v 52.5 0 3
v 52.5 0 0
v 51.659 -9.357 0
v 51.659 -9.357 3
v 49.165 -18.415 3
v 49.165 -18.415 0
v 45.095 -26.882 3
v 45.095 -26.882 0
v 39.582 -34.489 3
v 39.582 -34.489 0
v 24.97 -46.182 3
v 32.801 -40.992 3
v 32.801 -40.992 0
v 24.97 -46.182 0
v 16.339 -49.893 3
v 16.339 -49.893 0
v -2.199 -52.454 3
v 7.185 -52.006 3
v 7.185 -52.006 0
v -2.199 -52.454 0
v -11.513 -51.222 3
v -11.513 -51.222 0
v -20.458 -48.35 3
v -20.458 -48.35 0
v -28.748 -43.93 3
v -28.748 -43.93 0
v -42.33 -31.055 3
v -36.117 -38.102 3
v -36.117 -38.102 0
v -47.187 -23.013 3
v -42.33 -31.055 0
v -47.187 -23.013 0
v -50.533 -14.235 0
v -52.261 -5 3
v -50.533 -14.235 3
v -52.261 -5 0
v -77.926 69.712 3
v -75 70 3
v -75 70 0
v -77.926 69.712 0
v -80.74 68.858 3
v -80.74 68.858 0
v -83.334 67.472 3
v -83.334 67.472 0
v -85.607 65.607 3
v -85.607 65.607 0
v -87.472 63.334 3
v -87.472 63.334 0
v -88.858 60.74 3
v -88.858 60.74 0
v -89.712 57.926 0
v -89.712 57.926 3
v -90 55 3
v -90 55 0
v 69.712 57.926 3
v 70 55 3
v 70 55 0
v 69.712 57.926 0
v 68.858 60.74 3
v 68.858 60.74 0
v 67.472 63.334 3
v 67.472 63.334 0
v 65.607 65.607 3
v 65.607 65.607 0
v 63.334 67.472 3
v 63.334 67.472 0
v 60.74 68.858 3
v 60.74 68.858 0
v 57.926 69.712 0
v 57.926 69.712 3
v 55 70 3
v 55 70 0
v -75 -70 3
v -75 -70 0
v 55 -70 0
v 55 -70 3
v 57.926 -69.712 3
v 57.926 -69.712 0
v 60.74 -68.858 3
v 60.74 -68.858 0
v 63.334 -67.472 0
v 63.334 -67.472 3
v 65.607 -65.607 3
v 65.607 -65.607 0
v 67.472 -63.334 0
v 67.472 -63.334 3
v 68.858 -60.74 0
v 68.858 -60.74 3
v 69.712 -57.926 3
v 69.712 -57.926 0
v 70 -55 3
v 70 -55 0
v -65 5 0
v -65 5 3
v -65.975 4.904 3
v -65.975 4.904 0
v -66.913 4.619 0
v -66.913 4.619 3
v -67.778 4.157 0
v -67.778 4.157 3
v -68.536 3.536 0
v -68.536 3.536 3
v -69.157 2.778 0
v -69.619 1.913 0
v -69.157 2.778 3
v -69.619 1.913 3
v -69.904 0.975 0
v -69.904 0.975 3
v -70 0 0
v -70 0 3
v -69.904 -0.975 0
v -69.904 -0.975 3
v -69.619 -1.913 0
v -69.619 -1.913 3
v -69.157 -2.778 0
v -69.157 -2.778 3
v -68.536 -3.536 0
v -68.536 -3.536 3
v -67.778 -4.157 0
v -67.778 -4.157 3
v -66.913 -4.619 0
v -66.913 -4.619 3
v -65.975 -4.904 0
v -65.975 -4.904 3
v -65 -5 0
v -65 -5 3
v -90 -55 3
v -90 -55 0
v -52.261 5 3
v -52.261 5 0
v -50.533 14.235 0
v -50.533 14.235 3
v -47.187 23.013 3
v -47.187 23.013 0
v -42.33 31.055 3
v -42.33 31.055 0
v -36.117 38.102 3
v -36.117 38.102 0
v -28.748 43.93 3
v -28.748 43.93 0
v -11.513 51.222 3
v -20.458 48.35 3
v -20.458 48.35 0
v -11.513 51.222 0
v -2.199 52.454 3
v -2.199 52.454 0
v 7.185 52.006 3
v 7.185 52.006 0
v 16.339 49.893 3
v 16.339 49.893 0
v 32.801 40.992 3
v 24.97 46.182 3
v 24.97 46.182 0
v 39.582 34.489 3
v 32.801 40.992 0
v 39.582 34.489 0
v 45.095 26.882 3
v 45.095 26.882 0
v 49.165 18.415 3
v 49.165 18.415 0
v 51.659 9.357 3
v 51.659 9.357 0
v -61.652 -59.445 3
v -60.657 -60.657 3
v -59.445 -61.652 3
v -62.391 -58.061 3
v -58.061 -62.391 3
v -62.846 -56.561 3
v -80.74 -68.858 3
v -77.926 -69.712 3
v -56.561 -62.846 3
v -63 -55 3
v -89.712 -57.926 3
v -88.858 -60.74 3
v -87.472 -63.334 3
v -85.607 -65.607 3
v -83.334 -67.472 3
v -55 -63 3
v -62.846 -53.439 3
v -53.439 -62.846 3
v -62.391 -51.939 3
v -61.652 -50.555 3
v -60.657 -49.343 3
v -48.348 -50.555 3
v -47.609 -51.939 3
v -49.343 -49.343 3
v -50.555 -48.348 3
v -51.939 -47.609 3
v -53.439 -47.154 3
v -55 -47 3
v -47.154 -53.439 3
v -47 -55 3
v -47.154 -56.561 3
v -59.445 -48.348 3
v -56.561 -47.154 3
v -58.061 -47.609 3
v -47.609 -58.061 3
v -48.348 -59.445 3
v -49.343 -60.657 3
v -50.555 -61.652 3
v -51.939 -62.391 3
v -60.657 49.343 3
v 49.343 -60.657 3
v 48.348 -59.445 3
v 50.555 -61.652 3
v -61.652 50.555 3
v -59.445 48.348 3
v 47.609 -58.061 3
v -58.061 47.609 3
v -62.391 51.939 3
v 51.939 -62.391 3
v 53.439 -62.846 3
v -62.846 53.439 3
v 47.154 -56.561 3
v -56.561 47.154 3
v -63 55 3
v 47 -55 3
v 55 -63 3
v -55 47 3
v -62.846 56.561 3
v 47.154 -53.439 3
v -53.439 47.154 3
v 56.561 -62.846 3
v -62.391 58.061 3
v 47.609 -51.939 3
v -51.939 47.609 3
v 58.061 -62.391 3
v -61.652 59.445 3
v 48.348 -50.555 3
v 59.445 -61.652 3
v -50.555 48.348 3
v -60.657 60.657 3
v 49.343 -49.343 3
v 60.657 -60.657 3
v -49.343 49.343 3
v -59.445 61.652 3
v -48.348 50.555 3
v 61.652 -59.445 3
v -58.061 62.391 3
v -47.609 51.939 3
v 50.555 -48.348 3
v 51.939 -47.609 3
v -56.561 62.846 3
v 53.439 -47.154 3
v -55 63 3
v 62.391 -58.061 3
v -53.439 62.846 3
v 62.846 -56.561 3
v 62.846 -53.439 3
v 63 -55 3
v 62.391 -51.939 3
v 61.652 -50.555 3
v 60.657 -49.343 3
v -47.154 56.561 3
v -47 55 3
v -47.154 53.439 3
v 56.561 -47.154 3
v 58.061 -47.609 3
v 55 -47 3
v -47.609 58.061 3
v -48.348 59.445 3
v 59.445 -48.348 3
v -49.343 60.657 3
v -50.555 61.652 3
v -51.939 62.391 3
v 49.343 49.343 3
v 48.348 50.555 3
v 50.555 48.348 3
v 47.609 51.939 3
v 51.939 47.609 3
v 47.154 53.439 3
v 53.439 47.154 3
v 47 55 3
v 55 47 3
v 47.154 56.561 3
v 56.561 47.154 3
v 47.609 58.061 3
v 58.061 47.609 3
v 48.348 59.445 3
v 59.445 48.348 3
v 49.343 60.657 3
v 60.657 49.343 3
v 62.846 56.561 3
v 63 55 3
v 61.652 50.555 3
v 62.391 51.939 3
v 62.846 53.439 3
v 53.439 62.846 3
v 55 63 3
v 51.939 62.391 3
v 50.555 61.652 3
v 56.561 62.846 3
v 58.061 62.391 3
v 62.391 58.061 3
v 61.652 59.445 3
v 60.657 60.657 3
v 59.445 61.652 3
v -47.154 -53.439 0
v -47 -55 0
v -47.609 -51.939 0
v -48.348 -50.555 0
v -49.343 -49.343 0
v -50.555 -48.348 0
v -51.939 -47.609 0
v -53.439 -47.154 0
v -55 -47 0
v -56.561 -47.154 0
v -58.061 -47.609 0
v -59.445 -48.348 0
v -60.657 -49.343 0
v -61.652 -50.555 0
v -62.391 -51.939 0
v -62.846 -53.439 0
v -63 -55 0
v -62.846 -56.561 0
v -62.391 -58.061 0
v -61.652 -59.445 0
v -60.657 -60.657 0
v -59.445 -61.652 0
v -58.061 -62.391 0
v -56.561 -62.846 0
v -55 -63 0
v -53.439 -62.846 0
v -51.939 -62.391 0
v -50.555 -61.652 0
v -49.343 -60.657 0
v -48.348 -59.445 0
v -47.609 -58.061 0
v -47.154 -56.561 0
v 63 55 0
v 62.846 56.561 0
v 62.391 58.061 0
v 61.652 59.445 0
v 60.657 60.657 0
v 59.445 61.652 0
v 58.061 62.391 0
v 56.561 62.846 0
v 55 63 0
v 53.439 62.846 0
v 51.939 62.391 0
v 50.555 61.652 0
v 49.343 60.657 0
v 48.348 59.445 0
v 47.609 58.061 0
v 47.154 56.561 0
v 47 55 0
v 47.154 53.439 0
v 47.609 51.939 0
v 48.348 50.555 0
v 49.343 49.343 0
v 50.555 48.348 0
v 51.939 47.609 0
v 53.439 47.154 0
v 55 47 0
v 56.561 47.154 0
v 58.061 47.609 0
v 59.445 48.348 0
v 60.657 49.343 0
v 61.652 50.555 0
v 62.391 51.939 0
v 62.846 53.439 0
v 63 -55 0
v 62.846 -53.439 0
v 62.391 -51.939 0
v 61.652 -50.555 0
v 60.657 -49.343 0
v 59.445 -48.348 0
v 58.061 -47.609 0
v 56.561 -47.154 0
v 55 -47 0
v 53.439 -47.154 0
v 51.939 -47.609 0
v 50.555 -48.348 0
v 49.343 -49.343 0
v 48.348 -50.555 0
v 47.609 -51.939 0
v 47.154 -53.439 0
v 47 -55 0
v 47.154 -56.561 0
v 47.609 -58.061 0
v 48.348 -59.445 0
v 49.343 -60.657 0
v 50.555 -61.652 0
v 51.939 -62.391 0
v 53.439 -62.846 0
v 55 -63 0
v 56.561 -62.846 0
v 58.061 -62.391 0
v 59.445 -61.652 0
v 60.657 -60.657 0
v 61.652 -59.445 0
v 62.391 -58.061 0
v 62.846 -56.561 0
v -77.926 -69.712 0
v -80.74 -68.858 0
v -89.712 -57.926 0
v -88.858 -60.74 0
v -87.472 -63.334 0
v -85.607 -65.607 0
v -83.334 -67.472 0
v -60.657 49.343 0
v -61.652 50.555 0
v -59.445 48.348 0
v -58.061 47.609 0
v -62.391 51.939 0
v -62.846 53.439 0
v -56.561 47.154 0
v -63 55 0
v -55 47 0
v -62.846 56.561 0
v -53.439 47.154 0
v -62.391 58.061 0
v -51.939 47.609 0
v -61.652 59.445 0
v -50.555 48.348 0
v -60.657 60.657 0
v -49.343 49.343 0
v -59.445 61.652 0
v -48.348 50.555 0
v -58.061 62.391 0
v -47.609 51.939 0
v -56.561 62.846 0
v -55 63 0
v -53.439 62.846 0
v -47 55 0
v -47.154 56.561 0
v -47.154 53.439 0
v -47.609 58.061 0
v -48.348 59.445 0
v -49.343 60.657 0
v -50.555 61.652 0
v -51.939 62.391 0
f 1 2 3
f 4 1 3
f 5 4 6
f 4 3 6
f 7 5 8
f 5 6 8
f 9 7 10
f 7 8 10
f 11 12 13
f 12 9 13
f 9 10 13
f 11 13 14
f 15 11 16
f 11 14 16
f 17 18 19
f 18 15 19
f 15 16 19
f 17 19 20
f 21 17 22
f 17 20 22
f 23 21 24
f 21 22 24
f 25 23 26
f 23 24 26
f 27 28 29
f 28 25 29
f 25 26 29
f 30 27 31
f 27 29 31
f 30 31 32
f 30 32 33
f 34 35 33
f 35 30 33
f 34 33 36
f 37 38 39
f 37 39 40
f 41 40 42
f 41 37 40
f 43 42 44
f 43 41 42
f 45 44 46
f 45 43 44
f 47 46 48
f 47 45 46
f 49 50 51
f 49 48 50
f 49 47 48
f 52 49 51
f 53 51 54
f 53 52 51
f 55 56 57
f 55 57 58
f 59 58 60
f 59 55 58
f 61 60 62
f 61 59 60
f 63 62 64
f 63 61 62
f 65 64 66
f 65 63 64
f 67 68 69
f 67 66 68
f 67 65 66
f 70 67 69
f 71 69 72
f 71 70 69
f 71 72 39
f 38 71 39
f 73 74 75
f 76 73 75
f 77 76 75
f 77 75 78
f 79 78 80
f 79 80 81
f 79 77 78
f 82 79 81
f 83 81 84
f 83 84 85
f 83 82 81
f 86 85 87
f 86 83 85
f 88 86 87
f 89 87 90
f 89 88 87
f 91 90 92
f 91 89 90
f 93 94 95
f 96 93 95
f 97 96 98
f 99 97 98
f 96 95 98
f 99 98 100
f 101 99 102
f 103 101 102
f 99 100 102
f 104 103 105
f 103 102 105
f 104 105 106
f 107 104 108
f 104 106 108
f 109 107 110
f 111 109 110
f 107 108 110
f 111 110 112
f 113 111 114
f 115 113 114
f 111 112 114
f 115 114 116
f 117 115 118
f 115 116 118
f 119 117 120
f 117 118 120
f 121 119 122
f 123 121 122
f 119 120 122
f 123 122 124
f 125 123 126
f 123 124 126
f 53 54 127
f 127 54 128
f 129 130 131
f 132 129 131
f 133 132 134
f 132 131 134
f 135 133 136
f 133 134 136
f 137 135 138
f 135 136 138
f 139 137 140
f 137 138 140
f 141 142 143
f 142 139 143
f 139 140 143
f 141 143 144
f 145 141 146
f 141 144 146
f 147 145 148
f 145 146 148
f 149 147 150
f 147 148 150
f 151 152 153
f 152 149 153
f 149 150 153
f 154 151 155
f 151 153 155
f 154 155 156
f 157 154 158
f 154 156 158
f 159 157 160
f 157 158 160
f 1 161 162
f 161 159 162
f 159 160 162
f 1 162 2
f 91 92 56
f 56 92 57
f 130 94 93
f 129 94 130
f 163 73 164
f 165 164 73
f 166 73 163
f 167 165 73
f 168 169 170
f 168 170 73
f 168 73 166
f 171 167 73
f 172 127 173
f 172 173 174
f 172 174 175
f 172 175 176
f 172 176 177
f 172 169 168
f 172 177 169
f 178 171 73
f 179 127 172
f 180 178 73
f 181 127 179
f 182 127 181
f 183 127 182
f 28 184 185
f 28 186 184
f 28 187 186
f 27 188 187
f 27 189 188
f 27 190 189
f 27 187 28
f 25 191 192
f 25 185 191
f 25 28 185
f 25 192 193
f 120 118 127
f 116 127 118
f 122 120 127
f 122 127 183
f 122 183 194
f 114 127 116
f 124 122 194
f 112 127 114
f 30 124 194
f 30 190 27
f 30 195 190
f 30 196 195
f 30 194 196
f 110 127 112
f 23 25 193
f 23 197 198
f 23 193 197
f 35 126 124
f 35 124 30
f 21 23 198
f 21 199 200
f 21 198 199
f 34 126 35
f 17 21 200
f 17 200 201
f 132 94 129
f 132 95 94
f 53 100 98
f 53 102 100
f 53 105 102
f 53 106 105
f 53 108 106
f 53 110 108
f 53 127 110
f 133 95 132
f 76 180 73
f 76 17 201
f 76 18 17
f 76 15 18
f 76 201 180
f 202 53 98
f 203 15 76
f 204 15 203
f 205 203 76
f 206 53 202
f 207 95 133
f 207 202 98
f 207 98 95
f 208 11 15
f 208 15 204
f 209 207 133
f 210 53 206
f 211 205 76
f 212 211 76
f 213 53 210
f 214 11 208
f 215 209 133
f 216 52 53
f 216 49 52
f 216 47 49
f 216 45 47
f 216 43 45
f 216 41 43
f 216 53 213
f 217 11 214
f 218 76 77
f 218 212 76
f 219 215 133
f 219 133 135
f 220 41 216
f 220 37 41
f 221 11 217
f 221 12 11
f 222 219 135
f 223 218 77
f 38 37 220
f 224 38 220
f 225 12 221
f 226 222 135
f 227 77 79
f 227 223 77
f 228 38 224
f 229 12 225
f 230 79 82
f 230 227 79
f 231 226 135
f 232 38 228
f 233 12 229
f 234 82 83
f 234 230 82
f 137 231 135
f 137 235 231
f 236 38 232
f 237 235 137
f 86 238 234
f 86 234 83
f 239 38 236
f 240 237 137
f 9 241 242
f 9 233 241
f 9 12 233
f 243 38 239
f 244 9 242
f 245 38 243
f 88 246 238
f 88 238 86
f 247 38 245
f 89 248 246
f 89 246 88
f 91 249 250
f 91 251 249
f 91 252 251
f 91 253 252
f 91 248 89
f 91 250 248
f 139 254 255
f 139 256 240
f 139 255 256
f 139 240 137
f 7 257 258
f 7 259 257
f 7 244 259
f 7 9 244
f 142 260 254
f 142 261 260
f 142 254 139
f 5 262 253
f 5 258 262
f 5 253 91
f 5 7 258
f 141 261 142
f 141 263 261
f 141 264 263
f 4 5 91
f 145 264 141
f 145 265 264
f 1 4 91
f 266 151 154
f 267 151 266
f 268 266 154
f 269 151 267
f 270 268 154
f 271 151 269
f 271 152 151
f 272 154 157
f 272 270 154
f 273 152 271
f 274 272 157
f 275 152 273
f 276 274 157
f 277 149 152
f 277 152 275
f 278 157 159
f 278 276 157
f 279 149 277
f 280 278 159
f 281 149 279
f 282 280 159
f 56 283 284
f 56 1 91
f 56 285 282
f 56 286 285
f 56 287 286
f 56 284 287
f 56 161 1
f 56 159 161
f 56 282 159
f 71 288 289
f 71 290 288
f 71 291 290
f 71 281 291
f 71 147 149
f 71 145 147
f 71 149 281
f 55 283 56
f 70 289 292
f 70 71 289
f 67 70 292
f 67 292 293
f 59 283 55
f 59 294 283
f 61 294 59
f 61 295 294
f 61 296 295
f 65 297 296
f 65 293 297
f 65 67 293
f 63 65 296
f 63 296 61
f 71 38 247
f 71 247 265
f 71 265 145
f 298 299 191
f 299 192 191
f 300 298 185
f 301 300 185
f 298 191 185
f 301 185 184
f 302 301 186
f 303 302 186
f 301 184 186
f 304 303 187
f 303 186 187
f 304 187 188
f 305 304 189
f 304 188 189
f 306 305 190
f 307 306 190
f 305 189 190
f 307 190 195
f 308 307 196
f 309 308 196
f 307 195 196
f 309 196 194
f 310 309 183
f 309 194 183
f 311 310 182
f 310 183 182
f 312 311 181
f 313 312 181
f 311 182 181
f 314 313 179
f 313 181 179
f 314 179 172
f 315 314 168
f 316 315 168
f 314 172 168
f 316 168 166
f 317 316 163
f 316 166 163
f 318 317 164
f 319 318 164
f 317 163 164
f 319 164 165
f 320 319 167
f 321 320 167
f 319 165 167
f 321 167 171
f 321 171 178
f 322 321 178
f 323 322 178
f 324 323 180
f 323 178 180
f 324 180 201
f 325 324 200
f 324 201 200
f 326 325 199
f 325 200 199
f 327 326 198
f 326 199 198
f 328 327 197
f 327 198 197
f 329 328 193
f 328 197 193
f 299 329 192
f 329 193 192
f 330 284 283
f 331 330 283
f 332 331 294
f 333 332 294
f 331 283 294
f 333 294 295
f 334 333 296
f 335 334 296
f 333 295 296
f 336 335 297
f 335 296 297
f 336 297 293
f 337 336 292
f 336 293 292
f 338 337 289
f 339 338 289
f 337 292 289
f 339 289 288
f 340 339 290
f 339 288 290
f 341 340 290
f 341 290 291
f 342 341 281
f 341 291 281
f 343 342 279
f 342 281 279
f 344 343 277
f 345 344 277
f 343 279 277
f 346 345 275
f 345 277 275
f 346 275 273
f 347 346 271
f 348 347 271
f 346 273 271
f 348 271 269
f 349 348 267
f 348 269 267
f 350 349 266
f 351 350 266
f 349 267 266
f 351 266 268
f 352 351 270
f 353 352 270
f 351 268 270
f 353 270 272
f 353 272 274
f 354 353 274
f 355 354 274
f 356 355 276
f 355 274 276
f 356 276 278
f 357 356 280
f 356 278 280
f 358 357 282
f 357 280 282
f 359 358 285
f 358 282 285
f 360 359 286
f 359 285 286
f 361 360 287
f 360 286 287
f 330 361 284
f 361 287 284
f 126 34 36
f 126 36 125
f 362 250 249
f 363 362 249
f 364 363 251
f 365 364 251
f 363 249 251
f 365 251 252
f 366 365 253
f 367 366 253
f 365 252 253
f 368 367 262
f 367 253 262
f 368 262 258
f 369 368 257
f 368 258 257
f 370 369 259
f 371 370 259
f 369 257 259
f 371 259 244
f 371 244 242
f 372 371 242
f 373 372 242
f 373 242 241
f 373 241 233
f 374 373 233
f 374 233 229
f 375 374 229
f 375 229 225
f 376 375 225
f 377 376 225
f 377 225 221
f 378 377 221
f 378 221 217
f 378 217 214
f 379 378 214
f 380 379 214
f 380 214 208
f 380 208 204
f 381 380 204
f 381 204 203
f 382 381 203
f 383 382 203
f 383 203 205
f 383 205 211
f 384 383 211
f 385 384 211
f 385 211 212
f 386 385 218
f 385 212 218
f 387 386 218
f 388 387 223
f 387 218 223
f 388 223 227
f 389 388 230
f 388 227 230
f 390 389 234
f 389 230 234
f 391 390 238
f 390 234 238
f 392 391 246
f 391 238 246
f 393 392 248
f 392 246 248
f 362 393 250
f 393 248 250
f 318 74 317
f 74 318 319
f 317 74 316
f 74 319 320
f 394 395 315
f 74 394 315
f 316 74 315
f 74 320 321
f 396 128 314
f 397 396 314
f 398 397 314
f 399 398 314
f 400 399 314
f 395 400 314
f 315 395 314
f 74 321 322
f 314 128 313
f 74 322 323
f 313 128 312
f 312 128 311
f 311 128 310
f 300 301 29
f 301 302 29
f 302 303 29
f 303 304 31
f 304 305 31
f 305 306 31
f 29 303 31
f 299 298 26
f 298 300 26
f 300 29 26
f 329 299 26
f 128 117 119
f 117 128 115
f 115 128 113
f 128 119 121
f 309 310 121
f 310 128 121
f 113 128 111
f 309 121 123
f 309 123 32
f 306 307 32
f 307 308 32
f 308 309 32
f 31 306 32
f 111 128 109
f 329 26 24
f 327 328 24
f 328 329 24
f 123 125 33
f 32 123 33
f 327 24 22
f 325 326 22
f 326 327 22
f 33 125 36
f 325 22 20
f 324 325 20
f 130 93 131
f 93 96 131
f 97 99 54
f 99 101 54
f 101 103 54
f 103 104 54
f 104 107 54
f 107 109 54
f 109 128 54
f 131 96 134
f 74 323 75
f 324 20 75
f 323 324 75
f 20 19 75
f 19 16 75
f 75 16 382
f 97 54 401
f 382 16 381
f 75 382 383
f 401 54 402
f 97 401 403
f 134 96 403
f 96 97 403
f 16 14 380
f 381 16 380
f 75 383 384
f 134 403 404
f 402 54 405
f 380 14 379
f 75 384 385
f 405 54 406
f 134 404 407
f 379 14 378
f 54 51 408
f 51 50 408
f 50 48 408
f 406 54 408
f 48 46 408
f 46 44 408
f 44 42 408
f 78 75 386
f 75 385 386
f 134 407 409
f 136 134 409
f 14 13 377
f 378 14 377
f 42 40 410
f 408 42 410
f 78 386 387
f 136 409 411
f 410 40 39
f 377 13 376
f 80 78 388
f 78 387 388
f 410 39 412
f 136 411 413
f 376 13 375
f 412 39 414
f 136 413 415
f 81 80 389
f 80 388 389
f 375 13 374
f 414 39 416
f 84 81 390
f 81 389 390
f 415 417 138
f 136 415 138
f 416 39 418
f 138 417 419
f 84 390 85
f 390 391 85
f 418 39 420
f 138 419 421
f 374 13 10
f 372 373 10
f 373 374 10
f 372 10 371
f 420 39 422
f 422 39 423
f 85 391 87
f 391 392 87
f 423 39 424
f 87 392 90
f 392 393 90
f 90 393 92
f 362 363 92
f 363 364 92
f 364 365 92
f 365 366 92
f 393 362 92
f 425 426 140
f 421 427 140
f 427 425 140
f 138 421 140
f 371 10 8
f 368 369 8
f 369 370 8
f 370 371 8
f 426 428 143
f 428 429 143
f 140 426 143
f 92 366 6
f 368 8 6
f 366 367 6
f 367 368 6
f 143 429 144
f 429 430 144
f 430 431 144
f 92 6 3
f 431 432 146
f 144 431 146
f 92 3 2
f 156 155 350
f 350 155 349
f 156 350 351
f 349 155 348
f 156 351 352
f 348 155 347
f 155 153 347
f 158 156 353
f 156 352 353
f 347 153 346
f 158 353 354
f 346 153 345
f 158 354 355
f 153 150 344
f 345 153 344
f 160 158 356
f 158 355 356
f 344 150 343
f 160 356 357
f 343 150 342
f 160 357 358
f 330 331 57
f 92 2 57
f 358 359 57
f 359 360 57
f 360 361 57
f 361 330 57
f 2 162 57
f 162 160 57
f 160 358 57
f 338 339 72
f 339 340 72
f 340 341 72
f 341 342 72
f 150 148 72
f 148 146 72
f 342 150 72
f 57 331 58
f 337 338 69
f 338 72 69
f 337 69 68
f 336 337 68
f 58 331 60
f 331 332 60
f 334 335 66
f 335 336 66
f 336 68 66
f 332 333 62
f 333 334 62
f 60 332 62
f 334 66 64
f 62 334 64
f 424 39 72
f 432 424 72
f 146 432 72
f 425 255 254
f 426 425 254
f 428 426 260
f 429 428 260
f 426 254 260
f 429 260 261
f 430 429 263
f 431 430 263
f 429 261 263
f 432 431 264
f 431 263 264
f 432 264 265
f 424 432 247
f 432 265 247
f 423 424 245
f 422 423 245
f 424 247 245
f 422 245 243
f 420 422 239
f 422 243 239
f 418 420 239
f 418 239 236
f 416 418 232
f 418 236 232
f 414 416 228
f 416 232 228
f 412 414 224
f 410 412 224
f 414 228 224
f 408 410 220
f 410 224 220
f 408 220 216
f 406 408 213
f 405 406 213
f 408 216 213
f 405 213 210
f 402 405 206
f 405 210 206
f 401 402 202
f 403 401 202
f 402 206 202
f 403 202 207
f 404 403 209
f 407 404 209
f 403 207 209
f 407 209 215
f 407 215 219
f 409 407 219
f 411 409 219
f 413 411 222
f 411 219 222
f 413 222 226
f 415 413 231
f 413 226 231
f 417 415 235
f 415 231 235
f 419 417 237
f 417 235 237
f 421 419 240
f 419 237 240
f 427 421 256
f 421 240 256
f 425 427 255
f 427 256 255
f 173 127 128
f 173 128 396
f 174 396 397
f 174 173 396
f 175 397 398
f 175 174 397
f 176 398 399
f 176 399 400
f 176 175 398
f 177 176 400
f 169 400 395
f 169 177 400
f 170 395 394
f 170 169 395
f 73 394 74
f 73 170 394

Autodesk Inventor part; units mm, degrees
ref_plane "YZ Plane" through (0, 0, 0) normal (1, 0, 0) x (0, 1, 0)
ref_plane "XZ Plane" through (0, 0, 0) normal (0, 1, 0) x (-1, 0, 0)
ref_plane "XY Plane" through (0, 0, 0) normal (0, 0, 1) x (1, 0, 0)
sketch "Esboço1" plane through (0, 0, 0) normal (0, 0, 1) x (1, 0, 0)
  line L0 (-90, -70) -> (70, -70)
  line L1 (70, -70) -> (70, 70)
  line L2 (70, 70) -> (-90, 70)
  line L3 (-90, 70) -> (-90, -70)
  circle A0 centre (0, 0) radius 52.5
  point P0 (70, 0)
  dimension "d0" = 140
  dimension "d1" = 160
  dimension "d2" = 70
  dimension "d3" = 105
extrude "Extrusão1" add sketch "Esboço1" along normal blind 3
sketch "Esboço2" plane through (0, 0, 3) normal (0, 0, 1) x (1, 0, 0)
  line L0 (70, -70) -> (70, 70) projected
  line L1 (70, 70) -> (-90, 70) projected
  line L2 (-90, -70) -> (70, -70) projected
  circle A0 centre (-55, 55) radius 8
  circle A1 centre (55, 55) radius 8
  circle A2 centre (55, -55) radius 8
  circle A3 centre (-55, -55) radius 8
  dimension "d6" = 16
  dimension "d7" = 15
  dimension "d8" = 15
  dimension "d9" = 15
  dimension "d10" = 15
  dimension "d11" = 110
extrude "Extrusão2" cut sketch "Esboço2" against normal up to next
sketch "Esboço3" plane through (0, 0, 3) normal (0, 0, 1) x (1, 0, 0)
  circle A0 centre (0, 0) radius 52.5 projected
  arc A1 (-65, 5) -> (-65, -5) centre (-65, 0) ccw
  line L0 (-65, 5) -> (-45, 5)
  line L1 (-45, 5) -> (-45, -5)
  line L2 (-45, -5) -> (-65, -5)
  dimension "d14" = 65
  dimension "d15" = 5
  dimension "d16" = 20
extrude "Extrusão3" cut sketch "Esboço3" against normal up to next contours L0 L1 L2 A0 | A0 L2 A1 L0 picked at (-47.4912, 0.5563)
fillet "Arredondamento1" radius 15 4 edges at (70, 70, 1.5) (70, -70, 1.5) (-90, -70, 1.5) (-90, 70, 1.5)
